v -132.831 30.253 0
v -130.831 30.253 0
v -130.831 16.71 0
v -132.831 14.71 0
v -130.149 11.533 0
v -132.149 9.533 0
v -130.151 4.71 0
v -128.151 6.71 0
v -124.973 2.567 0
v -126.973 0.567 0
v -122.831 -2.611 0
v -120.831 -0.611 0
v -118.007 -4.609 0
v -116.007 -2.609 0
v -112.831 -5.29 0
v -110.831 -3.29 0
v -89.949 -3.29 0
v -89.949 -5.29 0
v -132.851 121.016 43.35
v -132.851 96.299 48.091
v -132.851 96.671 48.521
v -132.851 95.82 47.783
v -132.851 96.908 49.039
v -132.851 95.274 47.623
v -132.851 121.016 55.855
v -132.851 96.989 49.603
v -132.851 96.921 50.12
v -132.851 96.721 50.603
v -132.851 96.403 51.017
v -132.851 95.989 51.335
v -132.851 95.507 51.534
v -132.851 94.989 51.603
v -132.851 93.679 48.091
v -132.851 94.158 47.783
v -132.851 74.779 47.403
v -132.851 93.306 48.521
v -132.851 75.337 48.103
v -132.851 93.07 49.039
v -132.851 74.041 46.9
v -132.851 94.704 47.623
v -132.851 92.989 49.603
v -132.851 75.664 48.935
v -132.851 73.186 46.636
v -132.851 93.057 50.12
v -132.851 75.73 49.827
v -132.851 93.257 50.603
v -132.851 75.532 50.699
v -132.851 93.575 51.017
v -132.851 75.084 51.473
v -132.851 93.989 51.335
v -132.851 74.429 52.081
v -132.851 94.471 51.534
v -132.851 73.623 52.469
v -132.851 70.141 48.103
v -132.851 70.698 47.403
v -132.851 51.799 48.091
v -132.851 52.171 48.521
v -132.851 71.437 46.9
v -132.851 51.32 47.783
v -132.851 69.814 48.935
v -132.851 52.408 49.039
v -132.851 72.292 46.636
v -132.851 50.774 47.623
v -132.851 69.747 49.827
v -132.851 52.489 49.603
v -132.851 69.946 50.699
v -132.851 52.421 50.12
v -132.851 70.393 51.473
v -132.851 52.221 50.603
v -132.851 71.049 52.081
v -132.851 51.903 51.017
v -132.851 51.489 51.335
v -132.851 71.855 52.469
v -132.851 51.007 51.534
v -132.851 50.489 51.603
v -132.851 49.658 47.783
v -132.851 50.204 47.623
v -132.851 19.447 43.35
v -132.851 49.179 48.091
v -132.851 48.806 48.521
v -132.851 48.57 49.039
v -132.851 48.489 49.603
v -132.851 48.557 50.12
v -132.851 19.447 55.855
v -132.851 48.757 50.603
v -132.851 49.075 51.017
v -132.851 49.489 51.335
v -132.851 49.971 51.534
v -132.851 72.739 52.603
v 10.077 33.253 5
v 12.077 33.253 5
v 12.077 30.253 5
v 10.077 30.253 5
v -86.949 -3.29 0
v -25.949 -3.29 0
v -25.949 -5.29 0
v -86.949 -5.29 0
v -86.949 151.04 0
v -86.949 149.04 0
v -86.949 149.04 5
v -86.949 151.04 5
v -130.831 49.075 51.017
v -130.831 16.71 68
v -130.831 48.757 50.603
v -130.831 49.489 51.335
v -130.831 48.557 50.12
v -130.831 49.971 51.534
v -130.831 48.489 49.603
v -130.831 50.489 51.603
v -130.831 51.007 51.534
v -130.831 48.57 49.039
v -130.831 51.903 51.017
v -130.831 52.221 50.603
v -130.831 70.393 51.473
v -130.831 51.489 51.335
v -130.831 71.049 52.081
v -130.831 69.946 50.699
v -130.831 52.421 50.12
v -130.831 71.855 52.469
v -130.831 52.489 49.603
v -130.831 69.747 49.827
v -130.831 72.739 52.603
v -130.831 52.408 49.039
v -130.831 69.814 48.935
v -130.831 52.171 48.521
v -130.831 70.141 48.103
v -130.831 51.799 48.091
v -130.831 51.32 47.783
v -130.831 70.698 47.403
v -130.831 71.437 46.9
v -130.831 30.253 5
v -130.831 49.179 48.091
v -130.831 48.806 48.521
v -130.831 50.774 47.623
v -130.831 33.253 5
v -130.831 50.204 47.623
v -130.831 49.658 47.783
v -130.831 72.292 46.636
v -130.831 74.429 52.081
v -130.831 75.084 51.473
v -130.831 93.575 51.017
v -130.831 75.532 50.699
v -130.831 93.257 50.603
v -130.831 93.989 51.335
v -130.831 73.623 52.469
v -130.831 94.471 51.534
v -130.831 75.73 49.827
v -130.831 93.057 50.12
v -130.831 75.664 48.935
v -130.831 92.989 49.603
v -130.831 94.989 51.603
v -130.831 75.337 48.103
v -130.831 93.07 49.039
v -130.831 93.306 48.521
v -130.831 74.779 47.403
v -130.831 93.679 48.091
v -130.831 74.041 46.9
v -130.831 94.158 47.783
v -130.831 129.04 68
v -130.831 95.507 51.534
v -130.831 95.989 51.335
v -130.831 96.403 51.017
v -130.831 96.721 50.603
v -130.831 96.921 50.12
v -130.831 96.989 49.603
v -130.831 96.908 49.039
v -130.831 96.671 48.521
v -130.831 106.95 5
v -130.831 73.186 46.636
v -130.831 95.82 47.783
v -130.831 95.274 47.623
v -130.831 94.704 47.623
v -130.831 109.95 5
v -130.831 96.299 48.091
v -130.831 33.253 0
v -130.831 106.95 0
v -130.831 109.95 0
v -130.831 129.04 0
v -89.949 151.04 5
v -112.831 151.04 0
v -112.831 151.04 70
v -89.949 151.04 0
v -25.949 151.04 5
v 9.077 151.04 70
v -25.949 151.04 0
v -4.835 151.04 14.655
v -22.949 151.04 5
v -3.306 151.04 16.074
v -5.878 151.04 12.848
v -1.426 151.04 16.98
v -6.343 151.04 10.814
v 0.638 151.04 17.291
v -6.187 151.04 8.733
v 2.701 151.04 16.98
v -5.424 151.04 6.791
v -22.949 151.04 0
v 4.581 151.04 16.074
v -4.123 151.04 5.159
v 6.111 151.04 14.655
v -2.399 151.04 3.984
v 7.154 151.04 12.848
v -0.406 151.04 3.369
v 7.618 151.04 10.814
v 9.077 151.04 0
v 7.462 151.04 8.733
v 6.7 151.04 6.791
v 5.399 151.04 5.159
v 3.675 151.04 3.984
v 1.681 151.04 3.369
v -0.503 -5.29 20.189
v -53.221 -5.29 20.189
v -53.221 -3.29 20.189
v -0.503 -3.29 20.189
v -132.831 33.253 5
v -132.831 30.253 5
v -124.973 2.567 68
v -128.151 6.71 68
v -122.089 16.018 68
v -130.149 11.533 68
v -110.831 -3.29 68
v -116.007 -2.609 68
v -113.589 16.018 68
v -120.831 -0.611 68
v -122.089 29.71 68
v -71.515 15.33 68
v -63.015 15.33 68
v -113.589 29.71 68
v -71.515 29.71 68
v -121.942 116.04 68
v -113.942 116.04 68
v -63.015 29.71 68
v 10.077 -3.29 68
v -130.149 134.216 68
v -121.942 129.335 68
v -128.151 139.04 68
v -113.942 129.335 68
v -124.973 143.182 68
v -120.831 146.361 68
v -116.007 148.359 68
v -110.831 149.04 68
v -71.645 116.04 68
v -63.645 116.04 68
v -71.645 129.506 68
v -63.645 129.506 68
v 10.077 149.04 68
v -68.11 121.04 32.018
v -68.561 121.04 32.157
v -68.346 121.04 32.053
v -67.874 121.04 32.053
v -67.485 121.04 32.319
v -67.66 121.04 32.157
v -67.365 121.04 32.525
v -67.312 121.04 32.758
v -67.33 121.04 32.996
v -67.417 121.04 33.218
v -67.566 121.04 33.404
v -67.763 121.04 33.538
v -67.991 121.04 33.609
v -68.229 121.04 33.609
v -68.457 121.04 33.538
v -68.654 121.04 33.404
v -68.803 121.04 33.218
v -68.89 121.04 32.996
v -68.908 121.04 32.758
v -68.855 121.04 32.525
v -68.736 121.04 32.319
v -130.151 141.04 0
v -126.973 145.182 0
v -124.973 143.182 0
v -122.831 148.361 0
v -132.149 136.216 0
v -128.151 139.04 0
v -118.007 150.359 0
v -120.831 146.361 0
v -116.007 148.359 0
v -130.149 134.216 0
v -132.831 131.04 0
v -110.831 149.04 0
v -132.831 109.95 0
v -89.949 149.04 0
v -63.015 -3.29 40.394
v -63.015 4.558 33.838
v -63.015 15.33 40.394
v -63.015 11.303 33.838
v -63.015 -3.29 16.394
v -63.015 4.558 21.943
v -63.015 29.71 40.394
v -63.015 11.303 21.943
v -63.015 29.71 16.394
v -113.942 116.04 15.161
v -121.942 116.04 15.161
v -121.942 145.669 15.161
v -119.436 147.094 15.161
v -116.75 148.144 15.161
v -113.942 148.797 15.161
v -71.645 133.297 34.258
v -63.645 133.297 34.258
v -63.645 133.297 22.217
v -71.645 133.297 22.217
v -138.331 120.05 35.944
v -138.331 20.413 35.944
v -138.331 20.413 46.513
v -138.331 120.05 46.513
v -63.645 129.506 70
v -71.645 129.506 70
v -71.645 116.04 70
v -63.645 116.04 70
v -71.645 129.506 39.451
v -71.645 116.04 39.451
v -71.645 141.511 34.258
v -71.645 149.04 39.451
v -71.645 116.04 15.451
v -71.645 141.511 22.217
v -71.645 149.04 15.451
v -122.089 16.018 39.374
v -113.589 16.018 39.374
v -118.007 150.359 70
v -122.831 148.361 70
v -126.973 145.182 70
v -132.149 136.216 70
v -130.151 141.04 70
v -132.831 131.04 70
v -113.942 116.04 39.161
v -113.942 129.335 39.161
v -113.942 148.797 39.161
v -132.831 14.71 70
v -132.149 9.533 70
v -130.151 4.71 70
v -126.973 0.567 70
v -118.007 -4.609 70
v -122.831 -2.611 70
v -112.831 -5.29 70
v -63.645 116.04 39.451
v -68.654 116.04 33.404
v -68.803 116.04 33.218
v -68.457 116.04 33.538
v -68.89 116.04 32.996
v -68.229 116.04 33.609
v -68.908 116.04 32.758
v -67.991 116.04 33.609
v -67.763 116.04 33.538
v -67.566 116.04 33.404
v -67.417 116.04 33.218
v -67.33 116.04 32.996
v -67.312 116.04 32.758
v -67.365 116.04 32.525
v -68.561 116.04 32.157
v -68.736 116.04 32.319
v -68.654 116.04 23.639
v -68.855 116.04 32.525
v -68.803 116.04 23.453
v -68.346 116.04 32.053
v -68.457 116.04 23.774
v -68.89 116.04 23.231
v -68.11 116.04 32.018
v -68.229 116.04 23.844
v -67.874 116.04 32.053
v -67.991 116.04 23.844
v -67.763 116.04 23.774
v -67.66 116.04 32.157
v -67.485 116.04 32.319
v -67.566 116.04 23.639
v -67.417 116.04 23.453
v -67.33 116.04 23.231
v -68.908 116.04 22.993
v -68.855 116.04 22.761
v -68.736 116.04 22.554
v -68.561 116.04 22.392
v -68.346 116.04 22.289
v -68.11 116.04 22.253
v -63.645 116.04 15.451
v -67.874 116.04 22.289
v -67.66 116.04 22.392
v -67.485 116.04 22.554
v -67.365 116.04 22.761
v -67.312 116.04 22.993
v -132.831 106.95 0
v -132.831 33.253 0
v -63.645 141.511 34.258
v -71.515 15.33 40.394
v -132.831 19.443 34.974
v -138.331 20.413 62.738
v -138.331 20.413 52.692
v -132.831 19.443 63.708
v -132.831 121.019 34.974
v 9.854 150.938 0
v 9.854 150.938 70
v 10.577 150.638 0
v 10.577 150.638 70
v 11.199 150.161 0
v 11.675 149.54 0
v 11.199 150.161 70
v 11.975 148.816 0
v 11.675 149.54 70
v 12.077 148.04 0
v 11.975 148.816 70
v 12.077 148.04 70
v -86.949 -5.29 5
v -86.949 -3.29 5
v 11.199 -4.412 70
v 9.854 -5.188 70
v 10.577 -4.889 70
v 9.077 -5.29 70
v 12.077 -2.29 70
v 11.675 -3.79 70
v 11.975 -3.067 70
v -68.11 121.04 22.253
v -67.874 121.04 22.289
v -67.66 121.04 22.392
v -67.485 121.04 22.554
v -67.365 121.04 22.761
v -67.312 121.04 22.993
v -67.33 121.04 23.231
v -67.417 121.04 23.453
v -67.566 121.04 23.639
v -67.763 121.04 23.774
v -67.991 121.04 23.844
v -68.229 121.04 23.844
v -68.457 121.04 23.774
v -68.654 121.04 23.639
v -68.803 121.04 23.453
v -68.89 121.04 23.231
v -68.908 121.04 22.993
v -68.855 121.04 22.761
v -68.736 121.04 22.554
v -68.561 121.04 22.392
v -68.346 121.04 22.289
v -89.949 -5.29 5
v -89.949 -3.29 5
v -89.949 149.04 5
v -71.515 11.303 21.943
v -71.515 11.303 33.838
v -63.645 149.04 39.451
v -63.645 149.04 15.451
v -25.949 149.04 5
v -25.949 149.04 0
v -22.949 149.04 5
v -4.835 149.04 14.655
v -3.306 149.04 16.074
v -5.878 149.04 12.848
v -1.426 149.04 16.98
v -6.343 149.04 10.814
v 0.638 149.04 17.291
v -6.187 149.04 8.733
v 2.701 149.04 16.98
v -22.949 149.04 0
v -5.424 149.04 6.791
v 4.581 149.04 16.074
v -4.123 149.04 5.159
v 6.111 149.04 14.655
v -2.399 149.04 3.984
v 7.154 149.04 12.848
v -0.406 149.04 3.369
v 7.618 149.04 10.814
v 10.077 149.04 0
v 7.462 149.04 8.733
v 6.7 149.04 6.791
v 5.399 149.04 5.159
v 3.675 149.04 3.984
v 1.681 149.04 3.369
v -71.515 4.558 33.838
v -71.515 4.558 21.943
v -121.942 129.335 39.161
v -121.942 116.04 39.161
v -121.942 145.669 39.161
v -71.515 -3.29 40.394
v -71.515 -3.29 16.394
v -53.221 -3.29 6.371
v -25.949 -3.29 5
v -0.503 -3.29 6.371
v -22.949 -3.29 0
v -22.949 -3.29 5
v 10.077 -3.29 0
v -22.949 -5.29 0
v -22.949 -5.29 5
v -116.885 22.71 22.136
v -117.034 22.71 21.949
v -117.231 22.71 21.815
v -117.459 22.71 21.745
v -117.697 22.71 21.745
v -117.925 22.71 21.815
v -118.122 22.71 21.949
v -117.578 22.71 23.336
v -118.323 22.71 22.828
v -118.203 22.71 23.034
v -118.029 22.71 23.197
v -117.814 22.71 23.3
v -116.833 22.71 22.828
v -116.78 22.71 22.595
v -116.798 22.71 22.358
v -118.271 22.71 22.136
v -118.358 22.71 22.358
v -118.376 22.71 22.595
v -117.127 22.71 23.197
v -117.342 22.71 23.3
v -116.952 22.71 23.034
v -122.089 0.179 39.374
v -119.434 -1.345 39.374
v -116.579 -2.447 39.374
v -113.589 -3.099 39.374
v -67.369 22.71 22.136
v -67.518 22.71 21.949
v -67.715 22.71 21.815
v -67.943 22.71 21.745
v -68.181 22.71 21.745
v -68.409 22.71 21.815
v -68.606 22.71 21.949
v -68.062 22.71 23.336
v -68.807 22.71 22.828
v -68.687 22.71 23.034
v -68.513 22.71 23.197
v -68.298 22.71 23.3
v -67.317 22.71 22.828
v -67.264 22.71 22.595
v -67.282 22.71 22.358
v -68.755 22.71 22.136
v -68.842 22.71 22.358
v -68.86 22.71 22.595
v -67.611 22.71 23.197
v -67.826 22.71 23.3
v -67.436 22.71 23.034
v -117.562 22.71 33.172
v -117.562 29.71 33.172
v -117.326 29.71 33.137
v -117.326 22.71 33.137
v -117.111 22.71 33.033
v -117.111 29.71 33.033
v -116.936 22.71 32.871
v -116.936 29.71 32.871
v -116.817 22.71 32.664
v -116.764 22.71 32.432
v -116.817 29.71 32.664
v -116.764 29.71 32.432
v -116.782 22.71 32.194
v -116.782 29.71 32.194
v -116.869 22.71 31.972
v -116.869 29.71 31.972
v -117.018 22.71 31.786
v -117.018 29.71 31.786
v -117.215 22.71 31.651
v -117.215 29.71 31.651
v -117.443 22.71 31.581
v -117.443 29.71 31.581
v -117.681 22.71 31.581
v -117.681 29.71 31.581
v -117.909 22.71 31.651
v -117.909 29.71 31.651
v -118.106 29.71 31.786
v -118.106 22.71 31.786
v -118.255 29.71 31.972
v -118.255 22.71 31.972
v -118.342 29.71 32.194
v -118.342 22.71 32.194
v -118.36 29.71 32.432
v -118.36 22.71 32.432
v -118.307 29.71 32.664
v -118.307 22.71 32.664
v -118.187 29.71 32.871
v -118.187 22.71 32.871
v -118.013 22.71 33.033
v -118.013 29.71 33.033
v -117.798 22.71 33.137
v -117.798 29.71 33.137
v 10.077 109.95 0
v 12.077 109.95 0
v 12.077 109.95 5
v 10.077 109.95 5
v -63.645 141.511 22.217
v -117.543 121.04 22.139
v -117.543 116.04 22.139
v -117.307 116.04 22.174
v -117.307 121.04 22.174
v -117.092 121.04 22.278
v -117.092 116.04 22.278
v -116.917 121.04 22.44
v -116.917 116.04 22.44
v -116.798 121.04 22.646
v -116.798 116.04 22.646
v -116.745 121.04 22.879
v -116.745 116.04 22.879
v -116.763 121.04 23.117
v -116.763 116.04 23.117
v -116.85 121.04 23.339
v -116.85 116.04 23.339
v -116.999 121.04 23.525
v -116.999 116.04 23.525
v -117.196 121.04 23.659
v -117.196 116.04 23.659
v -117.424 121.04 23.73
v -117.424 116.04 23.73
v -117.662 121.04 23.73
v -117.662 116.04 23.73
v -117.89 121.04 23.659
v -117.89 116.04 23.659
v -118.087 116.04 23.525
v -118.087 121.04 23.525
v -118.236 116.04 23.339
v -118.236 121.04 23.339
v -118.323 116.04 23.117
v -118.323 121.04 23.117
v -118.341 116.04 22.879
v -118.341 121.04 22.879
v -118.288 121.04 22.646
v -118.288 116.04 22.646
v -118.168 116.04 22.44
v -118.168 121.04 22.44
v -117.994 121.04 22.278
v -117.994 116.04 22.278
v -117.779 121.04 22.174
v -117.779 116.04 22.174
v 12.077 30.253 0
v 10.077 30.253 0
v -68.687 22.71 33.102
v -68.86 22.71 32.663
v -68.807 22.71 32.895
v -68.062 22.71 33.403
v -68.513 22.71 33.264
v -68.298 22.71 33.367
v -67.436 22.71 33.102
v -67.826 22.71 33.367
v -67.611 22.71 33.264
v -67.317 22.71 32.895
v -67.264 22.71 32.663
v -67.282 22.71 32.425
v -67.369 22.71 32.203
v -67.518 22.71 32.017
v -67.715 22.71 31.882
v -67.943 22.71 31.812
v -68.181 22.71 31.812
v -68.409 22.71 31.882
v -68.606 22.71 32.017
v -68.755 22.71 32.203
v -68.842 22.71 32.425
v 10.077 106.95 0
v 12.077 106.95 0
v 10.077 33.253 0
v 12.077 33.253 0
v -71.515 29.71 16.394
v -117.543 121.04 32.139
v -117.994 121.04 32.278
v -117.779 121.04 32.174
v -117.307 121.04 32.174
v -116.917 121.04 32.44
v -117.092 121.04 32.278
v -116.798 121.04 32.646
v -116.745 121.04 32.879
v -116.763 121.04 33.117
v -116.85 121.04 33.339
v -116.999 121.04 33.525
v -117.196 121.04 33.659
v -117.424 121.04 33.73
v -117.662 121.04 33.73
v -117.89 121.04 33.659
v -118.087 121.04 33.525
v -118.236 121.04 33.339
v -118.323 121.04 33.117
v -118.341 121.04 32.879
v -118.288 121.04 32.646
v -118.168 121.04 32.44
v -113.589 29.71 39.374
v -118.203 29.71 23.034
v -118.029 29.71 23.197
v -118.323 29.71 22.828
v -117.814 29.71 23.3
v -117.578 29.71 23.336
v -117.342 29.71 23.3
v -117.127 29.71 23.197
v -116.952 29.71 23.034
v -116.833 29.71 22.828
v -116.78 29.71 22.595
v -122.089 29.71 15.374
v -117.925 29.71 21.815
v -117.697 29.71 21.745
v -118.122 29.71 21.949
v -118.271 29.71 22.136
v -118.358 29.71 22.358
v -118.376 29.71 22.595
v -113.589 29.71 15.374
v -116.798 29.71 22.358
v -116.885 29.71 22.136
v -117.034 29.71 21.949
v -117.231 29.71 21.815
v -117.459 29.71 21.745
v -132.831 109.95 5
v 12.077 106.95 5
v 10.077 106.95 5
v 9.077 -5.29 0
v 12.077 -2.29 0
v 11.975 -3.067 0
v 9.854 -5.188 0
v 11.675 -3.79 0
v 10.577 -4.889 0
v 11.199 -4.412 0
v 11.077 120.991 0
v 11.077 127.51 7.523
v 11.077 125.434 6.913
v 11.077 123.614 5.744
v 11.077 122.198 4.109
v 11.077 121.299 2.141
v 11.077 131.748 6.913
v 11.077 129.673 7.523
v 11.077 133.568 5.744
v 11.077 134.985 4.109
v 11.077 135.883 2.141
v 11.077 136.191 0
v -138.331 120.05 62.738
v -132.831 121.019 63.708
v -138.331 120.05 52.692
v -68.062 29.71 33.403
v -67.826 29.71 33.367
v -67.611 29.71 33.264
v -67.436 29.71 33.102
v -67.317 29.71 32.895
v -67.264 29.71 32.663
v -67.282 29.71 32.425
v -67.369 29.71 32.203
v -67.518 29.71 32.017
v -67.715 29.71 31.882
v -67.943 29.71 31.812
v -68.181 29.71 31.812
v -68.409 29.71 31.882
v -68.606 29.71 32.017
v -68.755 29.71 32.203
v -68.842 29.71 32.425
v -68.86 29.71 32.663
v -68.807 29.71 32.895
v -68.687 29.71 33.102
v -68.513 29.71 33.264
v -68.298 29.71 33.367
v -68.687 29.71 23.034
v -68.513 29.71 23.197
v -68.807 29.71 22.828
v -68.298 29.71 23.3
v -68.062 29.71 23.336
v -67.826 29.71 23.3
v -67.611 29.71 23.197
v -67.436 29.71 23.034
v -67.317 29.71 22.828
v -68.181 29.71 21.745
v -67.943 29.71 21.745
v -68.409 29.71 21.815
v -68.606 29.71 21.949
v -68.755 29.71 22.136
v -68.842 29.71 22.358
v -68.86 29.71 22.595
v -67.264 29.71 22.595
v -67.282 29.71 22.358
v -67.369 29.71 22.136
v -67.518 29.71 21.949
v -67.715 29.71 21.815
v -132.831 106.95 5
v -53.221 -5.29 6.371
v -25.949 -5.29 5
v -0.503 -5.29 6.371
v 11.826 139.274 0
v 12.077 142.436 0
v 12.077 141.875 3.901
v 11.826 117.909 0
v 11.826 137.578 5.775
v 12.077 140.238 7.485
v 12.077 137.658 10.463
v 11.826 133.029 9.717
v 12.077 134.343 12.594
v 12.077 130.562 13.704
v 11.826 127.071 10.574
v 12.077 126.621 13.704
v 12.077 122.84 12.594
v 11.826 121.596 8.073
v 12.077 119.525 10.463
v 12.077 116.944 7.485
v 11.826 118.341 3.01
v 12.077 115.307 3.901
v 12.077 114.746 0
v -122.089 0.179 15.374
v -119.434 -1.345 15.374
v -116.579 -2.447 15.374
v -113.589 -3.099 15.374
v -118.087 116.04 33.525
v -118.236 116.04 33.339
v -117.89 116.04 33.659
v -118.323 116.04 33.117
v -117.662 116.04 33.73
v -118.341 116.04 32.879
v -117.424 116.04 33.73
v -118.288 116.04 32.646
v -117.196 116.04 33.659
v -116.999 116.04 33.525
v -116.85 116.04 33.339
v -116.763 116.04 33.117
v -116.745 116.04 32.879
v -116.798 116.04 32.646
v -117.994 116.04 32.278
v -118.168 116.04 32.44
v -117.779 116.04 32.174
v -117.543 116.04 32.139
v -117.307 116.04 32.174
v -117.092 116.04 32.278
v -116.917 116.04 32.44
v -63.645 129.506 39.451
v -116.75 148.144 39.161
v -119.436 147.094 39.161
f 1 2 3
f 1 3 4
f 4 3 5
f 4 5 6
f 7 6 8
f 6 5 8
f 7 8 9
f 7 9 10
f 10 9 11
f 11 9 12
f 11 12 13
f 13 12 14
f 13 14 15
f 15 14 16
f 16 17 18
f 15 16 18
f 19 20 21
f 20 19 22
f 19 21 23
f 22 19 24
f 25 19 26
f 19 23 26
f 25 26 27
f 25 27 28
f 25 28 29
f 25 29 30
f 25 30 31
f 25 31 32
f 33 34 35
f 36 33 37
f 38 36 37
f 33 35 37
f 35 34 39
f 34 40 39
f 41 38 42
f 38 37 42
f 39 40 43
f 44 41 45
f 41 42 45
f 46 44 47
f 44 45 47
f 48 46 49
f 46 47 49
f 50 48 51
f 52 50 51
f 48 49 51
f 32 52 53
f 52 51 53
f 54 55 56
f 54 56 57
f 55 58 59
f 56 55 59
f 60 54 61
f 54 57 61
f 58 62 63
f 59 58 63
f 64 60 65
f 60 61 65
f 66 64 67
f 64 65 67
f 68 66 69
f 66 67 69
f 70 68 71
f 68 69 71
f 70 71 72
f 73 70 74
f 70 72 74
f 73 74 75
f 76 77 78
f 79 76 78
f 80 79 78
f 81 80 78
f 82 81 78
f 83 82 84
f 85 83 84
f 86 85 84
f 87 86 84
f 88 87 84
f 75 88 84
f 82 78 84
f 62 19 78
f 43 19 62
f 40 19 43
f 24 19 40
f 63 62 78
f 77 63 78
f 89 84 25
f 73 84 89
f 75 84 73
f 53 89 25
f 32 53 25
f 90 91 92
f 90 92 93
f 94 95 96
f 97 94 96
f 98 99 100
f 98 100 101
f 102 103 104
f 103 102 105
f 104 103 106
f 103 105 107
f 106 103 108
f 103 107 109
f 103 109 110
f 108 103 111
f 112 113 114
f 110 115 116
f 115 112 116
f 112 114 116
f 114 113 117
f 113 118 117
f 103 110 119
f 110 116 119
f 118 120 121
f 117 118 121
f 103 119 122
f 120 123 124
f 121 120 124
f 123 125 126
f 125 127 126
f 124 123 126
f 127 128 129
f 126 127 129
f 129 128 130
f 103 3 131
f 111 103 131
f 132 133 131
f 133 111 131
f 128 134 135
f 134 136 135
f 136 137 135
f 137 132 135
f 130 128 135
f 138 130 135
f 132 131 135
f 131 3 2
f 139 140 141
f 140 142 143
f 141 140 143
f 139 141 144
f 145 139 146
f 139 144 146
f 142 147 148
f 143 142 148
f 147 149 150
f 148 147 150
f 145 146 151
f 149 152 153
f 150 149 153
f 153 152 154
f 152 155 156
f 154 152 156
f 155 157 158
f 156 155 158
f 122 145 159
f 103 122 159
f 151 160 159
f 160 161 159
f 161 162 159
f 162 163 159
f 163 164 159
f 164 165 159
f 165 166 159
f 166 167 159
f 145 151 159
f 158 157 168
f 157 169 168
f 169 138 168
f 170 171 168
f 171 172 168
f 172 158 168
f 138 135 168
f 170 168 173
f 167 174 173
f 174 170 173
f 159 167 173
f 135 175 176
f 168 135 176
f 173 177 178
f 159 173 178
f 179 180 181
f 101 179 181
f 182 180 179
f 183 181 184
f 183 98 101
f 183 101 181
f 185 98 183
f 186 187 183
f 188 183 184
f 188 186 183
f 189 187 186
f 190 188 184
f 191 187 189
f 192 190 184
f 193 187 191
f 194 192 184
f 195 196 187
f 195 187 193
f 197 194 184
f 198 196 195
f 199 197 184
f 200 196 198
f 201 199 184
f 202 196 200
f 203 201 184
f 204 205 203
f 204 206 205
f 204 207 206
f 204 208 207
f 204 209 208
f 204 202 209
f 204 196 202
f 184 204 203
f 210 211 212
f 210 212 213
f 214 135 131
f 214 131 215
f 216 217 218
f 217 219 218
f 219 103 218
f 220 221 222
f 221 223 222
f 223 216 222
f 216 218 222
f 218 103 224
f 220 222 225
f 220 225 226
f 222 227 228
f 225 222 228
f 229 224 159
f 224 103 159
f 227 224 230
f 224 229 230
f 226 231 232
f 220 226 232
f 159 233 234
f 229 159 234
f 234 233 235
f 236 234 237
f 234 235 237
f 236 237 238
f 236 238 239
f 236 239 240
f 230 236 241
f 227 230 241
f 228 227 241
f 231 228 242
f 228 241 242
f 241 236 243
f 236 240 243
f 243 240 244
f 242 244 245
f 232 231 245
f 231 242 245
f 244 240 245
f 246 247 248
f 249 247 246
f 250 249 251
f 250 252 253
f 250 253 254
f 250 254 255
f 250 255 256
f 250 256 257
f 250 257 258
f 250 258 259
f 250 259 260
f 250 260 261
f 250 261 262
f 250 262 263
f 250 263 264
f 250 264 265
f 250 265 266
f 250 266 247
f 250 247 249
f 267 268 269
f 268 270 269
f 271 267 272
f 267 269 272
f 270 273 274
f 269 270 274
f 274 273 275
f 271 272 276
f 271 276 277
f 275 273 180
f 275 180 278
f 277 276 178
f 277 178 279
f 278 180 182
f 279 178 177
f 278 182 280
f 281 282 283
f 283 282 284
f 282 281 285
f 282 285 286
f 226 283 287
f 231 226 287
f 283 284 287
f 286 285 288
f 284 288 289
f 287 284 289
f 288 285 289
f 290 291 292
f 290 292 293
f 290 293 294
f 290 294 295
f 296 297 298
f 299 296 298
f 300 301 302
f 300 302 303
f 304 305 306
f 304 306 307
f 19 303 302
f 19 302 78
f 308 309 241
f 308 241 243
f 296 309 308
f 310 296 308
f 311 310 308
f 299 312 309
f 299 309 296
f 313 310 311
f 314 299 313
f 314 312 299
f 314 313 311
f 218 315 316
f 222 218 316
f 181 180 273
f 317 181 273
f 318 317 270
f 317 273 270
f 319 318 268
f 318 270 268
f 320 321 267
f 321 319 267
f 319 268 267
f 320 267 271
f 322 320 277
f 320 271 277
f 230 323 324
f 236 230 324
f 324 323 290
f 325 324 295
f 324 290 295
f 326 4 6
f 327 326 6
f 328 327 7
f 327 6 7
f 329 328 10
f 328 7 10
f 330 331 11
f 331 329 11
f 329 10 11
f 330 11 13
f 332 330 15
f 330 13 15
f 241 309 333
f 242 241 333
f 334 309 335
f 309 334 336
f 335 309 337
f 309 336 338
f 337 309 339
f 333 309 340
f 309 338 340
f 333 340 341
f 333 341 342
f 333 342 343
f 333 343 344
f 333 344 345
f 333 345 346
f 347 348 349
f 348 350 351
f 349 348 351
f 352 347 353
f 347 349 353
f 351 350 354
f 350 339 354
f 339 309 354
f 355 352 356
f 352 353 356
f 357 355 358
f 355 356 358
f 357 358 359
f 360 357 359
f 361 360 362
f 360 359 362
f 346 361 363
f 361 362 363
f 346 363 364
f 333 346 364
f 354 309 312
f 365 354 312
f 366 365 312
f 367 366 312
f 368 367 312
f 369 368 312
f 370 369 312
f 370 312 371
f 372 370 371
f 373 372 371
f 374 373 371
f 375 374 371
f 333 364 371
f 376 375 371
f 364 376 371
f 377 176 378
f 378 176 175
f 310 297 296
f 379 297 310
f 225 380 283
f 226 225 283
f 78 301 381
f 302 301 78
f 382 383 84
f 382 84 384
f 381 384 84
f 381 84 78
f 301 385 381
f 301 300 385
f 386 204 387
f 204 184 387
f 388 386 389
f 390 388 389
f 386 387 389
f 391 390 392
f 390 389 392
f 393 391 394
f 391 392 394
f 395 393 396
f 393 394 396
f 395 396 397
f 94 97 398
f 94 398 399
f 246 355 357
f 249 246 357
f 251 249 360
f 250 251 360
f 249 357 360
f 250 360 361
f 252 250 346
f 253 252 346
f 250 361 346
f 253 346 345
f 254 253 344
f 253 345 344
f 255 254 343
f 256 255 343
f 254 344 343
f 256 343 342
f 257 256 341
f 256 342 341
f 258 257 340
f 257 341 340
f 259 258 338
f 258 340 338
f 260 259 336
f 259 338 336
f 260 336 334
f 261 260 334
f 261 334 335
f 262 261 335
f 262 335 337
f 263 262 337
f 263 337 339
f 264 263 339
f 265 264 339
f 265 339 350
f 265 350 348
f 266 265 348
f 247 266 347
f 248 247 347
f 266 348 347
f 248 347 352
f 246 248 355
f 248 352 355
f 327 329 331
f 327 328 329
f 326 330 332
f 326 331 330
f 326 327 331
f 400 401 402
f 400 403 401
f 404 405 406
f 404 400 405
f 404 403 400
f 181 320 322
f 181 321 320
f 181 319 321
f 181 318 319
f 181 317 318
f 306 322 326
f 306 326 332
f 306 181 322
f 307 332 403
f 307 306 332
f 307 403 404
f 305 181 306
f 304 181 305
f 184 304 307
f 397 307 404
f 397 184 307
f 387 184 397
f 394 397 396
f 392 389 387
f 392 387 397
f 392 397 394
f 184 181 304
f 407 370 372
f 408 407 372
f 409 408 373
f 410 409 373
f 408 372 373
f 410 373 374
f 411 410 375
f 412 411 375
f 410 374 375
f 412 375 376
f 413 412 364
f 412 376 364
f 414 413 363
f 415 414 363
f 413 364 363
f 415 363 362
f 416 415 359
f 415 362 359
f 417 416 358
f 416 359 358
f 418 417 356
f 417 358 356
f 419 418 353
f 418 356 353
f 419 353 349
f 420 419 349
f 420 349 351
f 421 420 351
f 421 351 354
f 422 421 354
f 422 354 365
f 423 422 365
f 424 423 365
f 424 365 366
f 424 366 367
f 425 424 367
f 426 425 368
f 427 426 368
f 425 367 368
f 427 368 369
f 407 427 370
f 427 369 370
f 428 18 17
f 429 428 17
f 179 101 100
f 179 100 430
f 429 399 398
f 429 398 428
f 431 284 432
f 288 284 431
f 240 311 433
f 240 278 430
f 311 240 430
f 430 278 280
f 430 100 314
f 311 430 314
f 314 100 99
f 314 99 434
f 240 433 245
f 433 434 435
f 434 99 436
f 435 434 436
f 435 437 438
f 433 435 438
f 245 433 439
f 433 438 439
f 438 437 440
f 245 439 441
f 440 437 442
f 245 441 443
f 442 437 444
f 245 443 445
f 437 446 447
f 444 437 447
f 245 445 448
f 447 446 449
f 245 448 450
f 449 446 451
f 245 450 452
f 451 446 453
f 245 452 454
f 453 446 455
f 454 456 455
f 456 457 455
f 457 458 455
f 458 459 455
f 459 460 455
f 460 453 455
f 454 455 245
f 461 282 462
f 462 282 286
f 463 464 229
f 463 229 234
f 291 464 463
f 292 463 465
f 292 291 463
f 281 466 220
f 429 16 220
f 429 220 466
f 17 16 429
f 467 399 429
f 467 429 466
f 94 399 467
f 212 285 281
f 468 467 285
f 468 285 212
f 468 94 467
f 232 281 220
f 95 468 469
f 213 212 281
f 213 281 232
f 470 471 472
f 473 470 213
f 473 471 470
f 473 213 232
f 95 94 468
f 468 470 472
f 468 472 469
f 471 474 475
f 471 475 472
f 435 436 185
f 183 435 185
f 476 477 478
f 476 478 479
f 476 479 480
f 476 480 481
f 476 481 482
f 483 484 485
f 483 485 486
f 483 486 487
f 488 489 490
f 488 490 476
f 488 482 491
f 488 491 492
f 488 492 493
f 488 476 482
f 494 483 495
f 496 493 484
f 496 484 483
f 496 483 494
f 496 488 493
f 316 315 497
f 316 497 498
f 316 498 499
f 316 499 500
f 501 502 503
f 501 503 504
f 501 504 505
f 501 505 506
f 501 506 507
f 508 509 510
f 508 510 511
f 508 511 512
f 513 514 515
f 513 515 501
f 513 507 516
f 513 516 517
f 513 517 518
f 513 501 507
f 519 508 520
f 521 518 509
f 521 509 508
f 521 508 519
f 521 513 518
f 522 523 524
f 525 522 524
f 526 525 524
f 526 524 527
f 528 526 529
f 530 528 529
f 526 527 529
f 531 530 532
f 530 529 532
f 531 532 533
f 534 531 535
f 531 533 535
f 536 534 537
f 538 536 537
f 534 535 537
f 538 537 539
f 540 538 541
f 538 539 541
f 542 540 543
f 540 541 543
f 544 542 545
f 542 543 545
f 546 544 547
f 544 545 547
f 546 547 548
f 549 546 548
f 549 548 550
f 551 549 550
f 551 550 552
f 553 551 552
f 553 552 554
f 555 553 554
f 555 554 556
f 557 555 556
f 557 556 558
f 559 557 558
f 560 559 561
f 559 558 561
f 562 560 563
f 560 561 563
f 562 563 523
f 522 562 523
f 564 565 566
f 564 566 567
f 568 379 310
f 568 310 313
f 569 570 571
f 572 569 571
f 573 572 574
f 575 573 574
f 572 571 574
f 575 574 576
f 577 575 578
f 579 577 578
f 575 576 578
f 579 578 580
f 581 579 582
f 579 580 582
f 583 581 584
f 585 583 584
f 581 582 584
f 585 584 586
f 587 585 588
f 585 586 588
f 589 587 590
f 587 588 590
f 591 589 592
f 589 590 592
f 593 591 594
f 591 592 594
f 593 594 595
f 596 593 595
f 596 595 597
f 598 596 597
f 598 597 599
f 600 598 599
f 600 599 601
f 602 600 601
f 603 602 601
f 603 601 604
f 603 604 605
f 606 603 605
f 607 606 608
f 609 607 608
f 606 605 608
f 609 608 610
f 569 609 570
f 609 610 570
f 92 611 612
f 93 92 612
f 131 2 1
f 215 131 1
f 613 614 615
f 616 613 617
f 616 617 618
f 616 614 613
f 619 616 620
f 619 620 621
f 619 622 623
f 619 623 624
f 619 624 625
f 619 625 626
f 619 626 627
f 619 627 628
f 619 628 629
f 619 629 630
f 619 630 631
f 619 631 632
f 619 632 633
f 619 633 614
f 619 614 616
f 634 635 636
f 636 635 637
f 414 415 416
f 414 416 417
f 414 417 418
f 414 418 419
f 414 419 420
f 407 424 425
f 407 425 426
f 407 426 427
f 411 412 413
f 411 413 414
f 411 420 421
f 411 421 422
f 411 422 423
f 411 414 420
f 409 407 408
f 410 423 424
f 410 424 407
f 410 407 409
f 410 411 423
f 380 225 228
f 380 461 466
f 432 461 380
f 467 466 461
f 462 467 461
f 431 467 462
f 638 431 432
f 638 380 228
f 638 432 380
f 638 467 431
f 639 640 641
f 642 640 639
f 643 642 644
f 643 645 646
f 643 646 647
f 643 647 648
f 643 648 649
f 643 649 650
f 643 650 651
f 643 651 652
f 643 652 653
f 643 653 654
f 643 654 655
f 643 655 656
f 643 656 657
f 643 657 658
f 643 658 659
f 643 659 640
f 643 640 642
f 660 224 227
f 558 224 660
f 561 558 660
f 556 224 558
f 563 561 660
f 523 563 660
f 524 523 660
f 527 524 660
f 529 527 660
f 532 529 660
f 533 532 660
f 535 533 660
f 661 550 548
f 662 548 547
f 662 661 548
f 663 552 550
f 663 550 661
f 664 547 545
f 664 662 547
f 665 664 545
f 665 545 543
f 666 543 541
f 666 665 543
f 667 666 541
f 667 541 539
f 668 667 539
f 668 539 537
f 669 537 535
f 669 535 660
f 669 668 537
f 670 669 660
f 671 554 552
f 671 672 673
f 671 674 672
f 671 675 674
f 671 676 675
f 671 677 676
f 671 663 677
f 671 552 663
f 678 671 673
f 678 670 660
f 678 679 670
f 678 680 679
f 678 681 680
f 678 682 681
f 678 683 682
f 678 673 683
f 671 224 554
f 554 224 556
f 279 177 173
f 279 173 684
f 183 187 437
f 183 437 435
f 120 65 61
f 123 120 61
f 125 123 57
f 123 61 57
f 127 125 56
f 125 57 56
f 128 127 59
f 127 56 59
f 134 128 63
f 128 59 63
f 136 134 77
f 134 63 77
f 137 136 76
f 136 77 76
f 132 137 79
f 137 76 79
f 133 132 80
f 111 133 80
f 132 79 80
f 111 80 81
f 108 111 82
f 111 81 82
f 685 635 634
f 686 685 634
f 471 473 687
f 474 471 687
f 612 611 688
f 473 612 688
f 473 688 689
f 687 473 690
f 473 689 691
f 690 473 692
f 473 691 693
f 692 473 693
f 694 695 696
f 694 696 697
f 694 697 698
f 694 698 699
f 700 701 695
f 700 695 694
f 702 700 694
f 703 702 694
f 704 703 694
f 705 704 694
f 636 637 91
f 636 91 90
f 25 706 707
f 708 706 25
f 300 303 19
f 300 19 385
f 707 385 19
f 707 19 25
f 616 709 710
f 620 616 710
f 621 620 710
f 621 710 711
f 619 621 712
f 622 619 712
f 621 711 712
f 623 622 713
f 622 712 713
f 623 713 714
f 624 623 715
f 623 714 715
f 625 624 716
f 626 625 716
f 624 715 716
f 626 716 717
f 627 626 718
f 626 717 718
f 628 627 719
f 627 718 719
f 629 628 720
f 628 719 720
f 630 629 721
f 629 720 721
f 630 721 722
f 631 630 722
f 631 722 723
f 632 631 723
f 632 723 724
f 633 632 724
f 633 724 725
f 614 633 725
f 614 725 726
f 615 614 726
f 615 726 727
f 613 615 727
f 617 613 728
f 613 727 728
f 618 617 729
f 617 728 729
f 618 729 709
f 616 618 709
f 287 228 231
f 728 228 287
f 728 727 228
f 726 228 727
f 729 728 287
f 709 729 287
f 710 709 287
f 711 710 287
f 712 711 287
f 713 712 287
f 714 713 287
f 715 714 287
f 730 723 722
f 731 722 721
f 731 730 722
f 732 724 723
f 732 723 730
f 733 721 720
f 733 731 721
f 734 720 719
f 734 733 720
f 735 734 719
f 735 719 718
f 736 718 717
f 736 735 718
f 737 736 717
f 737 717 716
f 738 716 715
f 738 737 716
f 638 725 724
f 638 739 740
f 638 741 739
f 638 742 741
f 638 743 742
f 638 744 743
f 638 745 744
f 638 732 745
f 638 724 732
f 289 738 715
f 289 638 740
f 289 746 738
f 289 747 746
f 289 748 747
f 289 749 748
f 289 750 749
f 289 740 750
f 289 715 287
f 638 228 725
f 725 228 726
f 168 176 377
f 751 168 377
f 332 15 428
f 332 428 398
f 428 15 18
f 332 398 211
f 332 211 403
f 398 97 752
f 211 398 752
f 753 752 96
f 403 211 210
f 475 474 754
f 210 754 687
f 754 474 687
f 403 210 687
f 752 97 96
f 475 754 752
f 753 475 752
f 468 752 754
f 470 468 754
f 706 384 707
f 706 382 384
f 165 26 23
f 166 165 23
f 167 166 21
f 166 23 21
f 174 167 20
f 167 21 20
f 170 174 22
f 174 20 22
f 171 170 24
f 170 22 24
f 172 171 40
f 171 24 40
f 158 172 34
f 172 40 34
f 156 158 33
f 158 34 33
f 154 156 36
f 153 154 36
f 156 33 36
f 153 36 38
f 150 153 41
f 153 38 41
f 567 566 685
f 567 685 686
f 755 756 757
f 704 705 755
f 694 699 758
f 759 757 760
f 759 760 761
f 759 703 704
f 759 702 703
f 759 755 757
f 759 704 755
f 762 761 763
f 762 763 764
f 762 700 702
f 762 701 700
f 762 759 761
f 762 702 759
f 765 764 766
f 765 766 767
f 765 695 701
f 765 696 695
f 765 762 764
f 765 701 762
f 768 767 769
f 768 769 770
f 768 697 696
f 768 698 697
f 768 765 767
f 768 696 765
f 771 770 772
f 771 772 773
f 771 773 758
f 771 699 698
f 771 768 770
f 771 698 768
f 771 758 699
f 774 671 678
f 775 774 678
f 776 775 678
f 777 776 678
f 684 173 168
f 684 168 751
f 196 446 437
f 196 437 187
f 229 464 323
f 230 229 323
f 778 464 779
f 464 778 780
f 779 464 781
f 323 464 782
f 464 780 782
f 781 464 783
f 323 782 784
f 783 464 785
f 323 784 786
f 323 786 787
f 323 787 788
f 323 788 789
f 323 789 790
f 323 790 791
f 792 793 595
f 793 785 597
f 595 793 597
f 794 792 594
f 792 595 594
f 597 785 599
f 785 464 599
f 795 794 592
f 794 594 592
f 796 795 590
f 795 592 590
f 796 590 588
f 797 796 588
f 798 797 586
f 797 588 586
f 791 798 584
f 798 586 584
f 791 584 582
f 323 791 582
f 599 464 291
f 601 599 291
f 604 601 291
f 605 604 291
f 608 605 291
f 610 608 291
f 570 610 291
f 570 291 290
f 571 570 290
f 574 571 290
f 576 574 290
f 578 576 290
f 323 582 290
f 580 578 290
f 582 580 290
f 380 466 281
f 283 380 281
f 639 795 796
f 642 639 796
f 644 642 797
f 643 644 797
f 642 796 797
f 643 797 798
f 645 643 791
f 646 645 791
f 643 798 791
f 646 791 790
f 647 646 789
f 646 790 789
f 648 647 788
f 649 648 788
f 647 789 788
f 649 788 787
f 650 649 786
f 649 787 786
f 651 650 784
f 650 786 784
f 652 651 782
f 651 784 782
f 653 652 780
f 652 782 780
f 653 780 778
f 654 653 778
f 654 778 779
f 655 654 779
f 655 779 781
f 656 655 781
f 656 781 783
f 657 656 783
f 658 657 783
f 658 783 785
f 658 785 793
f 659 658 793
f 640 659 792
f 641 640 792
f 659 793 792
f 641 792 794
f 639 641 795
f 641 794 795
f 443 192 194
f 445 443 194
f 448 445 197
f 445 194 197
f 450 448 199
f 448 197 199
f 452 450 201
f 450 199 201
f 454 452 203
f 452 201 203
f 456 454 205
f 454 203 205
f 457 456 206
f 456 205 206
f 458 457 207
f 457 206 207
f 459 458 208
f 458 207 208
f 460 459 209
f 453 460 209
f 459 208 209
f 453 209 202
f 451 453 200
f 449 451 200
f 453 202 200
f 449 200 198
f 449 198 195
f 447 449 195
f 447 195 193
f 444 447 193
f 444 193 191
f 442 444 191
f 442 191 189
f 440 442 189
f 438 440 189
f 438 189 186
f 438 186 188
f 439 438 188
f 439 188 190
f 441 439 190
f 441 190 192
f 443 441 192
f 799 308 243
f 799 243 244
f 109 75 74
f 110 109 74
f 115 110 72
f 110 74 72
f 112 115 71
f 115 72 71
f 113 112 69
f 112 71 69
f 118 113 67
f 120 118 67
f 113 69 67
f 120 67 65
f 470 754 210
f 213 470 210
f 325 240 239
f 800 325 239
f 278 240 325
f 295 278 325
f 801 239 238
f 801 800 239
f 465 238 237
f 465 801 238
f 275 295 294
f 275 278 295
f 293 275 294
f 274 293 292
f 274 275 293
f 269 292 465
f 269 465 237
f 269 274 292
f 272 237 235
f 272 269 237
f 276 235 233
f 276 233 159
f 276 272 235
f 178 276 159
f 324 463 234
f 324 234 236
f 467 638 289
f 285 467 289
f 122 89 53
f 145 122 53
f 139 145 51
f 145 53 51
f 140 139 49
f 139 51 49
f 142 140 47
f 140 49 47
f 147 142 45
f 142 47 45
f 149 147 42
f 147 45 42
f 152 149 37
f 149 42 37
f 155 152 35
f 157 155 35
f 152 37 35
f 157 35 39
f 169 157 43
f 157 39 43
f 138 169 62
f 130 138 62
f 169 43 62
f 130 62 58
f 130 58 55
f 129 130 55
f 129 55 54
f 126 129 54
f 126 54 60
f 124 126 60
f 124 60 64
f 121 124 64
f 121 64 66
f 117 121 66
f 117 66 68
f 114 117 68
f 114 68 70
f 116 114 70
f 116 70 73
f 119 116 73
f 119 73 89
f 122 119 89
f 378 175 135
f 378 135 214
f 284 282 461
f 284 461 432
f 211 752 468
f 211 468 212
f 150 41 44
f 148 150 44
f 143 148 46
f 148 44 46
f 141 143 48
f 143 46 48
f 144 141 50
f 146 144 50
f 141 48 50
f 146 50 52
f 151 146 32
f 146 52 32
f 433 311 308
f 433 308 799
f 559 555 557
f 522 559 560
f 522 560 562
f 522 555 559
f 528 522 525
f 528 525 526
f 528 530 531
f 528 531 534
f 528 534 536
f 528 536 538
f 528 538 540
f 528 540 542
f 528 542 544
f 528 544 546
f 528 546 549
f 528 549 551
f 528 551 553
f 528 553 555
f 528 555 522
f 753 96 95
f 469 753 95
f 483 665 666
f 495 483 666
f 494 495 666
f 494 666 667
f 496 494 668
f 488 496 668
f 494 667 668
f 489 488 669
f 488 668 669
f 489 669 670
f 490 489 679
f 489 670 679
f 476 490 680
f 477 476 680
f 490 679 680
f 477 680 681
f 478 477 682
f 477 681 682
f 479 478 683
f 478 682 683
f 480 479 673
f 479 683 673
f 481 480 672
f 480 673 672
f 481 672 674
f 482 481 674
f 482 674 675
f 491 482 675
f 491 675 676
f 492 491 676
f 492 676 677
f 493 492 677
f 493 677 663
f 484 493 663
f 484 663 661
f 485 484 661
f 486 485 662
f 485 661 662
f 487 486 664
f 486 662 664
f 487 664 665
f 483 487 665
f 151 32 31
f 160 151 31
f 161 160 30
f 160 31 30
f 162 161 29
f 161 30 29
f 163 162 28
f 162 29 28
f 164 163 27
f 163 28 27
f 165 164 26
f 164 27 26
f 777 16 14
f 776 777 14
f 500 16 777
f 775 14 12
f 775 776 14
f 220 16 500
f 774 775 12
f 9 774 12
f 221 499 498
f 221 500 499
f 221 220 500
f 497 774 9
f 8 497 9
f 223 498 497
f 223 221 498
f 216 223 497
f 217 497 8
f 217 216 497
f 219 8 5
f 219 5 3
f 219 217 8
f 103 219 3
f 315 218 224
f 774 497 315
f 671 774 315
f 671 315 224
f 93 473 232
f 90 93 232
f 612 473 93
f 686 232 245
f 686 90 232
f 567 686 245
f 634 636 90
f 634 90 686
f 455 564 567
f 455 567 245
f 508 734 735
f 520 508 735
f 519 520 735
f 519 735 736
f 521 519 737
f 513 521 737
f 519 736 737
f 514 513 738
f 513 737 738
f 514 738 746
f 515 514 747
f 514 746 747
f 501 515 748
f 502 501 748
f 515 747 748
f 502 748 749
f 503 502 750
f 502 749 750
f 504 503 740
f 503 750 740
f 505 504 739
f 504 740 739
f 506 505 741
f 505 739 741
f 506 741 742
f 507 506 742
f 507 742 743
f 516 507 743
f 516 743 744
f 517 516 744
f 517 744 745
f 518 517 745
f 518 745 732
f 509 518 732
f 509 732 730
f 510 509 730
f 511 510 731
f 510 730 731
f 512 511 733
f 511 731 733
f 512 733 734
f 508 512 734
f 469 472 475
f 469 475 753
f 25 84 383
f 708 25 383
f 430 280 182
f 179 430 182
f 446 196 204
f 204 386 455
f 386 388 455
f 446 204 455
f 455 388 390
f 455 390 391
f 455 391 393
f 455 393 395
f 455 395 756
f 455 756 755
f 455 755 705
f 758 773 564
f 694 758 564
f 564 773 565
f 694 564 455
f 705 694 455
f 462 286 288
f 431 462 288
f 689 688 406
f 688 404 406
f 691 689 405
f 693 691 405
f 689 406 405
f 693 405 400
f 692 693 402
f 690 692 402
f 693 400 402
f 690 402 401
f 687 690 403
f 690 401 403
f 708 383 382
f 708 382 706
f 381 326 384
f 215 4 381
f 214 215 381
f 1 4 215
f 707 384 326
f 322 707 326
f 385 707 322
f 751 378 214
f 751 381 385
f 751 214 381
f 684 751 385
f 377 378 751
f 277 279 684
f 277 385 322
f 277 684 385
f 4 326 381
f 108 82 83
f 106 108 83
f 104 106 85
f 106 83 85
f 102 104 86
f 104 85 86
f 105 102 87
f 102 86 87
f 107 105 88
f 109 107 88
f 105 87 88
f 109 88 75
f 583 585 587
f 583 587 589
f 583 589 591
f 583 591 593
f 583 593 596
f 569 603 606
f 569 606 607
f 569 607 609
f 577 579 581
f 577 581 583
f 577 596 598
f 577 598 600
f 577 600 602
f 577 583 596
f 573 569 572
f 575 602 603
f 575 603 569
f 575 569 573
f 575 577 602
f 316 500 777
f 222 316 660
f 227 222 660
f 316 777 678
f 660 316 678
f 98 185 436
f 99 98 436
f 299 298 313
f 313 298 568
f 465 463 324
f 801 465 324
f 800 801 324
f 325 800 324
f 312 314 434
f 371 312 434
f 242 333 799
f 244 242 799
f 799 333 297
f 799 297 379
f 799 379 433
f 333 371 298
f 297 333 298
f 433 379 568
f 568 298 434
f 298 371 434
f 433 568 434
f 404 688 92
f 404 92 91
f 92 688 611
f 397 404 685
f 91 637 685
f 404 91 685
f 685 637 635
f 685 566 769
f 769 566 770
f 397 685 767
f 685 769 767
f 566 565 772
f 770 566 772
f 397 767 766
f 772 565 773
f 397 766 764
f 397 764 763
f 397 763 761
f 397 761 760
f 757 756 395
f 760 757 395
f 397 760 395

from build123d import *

# Parameters (mm, degrees)
ESQUISSE2_W              = 144.907881123
ESQUISSE2_H              = 156.330521118
BOSS_EXTRU_1_DEPTH       = 70
COQUE1_T                 = -2
ESQUISSE14_W             = 28.733729995
ESQUISSE14_H             = 101.576382864
BOSS_EXTRU_7_DEPTH       = 5.5
BOSS_EXTRU_7_TAPER       = 10
ENL_V_MAT_EXTRU_5_DEPTH  = 137.5
ESQUISSE16_R             = 3
ENL_V_MAT_EXTRU_6_DEPTH  = 3
ESQUISSE17_W             = 8
ESQUISSE17_H             = 24
BOSS_EXTRU_8_DEPTH       = 33
ESQUISSE18_W             = 12.041056231
ESQUISSE18_H             = 8.214509438
ENL_V_MAT_EXTRU_7_DEPTH  = 9
ESQUISSE19_R             = 0.8
ENL_V_MAT_EXTRU_8_DEPTH  = 5
ESQUISSE20_W             = 8.5
ESQUISSE20_H             = 24
BOSS_EXTRU_9_DEPTH       = 33
ESQUISSE22_W             = 11.894232579
ESQUISSE22_H             = 6.744261383
ENL_V_MAT_EXTRU_9_DEPTH  = 10
ESQUISSE25_W             = 8
ESQUISSE25_H             = 13.466046283
BOSS_EXTRU_10_DEPTH      = 30.549003
ESQUISSE26_W             = 8
ESQUISSE26_H             = 13.295181457
BOSS_EXTRU_11_DEPTH      = 30
ESQUISSE27_W             = 8.5
ESQUISSE27_H             = 13.691611871
BOSS_EXTRU_12_DEPTH      = 30
ESQUISSE28_W             = 8.5
ESQUISSE28_H             = 14.379576359
BOSS_EXTRU_14_DEPTH      = 29
ESQUISSE29_R             = 7
ENL_V_MAT_EXTRU_11_DEPTH = 5
ESQUISSE30_W             = 52.718186521
ESQUISSE30_H             = 13.817926224
ENL_V_MAT_EXTRU_12_DEPTH = 5
CONG_4_R                 = 20
CONG_5_R                 = 3
ENL_V_MAT_EXTRU_13_DEPTH = 1
CONG_6_R                 = 20
ESQUISSE21_R             = 0.8
ENL_V_MAT_EXTRU_14_DEPTH = 7
ESQUISSE34_W             = 2
ESQUISSE34_H             = 3
ESQUISSE34_W_2           = 3
ESQUISSE34_H_2           = 2
ENL_V_MAT_EXTRU_15_DEPTH = 5


with BuildPart() as part:
    # Esquisse2 → Boss.-Extru.1 (new body)
    with BuildSketch(Plane.XY):
        with Locations((-60.376721844, 72.874764276)):
            Rectangle(ESQUISSE2_W, ESQUISSE2_H)
    extrude(amount=BOSS_EXTRU_1_DEPTH)

    # Coque1
    coque1_openings = [part.faces().sort_by_distance(p)[0] for p in [
        (-60.376721844, 72.874764276, 0),
    ]]
    offset(amount=COQUE1_T, openings=coque1_openings, kind=Kind.INTERSECTION)

    # Esquisse14 → Boss.-Extru.7 (add)
    with BuildSketch(Plane.ZY.offset(132.830662405)):
        with Locations((49.34125564, 70.231172893)):
            Rectangle(ESQUISSE14_W, ESQUISSE14_H)
    extrude(amount=BOSS_EXTRU_7_DEPTH, taper=BOSS_EXTRU_7_TAPER)

    # Troue matien spirobs → Enlèv. mat.-Extru.5 (cut)
    # profile 1 of 2: a face of its own
    with BuildSketch(Plane(origin=(0, 0, 0), x_dir=(1, 0, 0), z_dir=(0, 1, 0))):
        Polygon((-132.851084635, -55.85540738), (-138.851094768, -52.391307109), (-138.851094768, -46.813956352), (-132.851084635, -43.34985608), align=None)
        Polygon((-133.351084635, -54.989382875), (-138.351094768, -52.102631674), (-138.351094768, -47.102631786), (-133.351084635, -44.215880585), align=None, mode=Mode.SUBTRACT)
    # profile 2 of 2: a face of its own
    with BuildSketch(Plane(origin=(0, 0, 0), x_dir=(1, 0, 0), z_dir=(0, 1, 0))):
        Polygon((-138.351094768, -52.102631674), (-138.351094768, -47.102631786), (-133.351084635, -44.215880585), (-133.351084635, -54.989382875), align=None)
    extrude(amount=ENL_V_MAT_EXTRU_5_DEPTH, mode=Mode.SUBTRACT)

    # Esquisse16 → Enlèv. mat.-Extru.6 (cut)
    with BuildSketch(Plane.ZY.offset(132.851084635)):
        with BuildLine():
            ThreePointArc((51.60263173, 94.988881377), (51.016845292, 96.403094939), (49.60263173, 96.988881377))
            Line((49.60263173, 96.988881377), (49.60263173, 92.988881377))
            ThreePointArc((49.60263173, 92.988881377), (51.016845292, 93.574667814), (51.60263173, 94.988881377))
        make_face()
        with BuildLine():
            Line((49.60263173, 92.988881377), (49.60263173, 96.988881377))
            ThreePointArc((49.60263173, 96.988881377), (47.60263173, 94.988881377), (49.60263173, 92.988881377))
        make_face()
        with BuildLine():
            ThreePointArc((51.60263173, 50.488881377), (51.016845292, 51.903094939), (49.60263173, 52.488881377))
            Line((49.60263173, 52.488881377), (49.60263173, 48.488881377))
            ThreePointArc((49.60263173, 48.488881377), (51.016845292, 49.074667814), (51.60263173, 50.488881377))
        make_face()
        with BuildLine():
            Line((49.60263173, 48.488881377), (49.60263173, 52.488881377))
            ThreePointArc((49.60263173, 52.488881377), (47.60263173, 50.488881377), (49.60263173, 48.488881377))
        make_face()
        with Locations((49.60263173, 72.738881377)):
            Circle(ESQUISSE16_R)
    extrude(amount=-ENL_V_MAT_EXTRU_6_DEPTH, mode=Mode.SUBTRACT)

    # Esquisse17 → Boss.-Extru.8 (add)
    with BuildSketch(Plane.XZ.offset(-149.040024835)):
        with Locations((-67.645104732, 27.450996733)):
            Rectangle(ESQUISSE17_W, ESQUISSE17_H)
        with Locations((-117.942168048, 27.160873918)):
            Rectangle(ESQUISSE17_W, ESQUISSE17_H)
    extrude(amount=BOSS_EXTRU_8_DEPTH)

    # Esquisse18 → Enlèv. mat.-Extru.7 (cut)
    with BuildSketch(Plane(origin=(-63.645104732, 0, 0), x_dir=(0, 0, -1), z_dir=(1, 0, 0))):
        with Locations((-28.237409826, 137.403900729)):
            Rectangle(ESQUISSE18_W, ESQUISSE18_H)
    extrude(amount=-ENL_V_MAT_EXTRU_7_DEPTH, mode=Mode.SUBTRACT)

    # Esquisse19 → Enlèv. mat.-Extru.8 (cut)
    with BuildSketch(Plane.XZ.offset(-116.040024835)):
        with Locations(Location((-68.110177619, 23.053024635, 0), (0, 0, 270))):
            Circle(ESQUISSE19_R)
        with Locations(Location((-68.110177619, 32.817579673, 0), (0, 0, 270))):
            Circle(ESQUISSE19_R)
        with Locations(Location((-117.542963794, 32.93870849, 0), (0, 0, 270))):
            Circle(ESQUISSE19_R)
        with Locations(Location((-117.542963794, 22.93870849, 0), (0, 0, 270))):
            Circle(ESQUISSE19_R)
    extrude(amount=-ENL_V_MAT_EXTRU_8_DEPTH, mode=Mode.SUBTRACT)

    # Esquisse20 → Boss.-Extru.9 (add)
    with BuildSketch(Plane(origin=(0, -3.290496283, 0), x_dir=(1, 0, 0), z_dir=(0, 1, 0))):
        with Locations((-117.838572927, -27.374102793)):
            Rectangle(ESQUISSE20_W, ESQUISSE20_H)
        with Locations((-67.264692574, -28.393869792)):
            Rectangle(ESQUISSE20_W, ESQUISSE20_H)
    extrude(amount=BOSS_EXTRU_9_DEPTH)

    # Esquisse22 → Enlèv. mat.-Extru.9 (cut)
    with BuildSketch(Plane(origin=(-63.014692574, 0, 0), x_dir=(0, 0, -1), z_dir=(1, 0, 0))):
        with Locations((-27.890614159, 7.930587585)):
            Rectangle(ESQUISSE22_W, ESQUISSE22_H)
    extrude(amount=-ENL_V_MAT_EXTRU_9_DEPTH, mode=Mode.SUBTRACT)

    # Esquisse25 → Boss.-Extru.10 (add)
    with BuildSketch(Plane.XY.offset(39.450996733)):
        with Locations((-67.645104732, 122.773047977)):
            Rectangle(ESQUISSE25_W, ESQUISSE25_H)
    extrude(amount=BOSS_EXTRU_10_DEPTH)

    # Esquisse26 → Boss.-Extru.11 (add)
    with BuildSketch(Plane.XY.offset(39.160873918)):
        with Locations((-117.942168048, 122.687615564)):
            Rectangle(ESQUISSE26_W, ESQUISSE26_H)
    extrude(amount=BOSS_EXTRU_11_DEPTH)

    # Esquisse27 → Boss.-Extru.12 (add)
    with BuildSketch(Plane.XY.offset(39.374102793)):
        with Locations((-117.838572927, 22.863697782)):
            Rectangle(ESQUISSE27_W, ESQUISSE27_H)
    extrude(amount=BOSS_EXTRU_12_DEPTH)

    # Esquisse28 → Boss.-Extru.14 (add)
    with BuildSketch(Plane.XY.offset(40.393869792)):
        with Locations((-67.264692574, 22.519715538)):
            Rectangle(ESQUISSE28_W, ESQUISSE28_H)
    extrude(amount=BOSS_EXTRU_14_DEPTH)

    # Esquisse29 → Enlèv. mat.-Extru.11 (cut)
    with BuildSketch(Plane(origin=(0, 151.040024835, 0), x_dir=(1, 0, 0), z_dir=(0, 1, 0))):
        with Locations(Location((0.637722391, -10.29069879, 0), (0, 0, 270))):
            Circle(ESQUISSE29_R)
    extrude(amount=-ENL_V_MAT_EXTRU_11_DEPTH, mode=Mode.SUBTRACT)

    # Esquisse30 → Enlèv. mat.-Extru.12 (cut)
    with BuildSketch(Plane.XZ.offset(5.290496283)):
        with Locations((-26.862211313, 13.280210157)):
            Rectangle(ESQUISSE30_W, ESQUISSE30_H)
    extrude(amount=-ENL_V_MAT_EXTRU_12_DEPTH, mode=Mode.SUBTRACT)

    # Congé4
    # the kernel refuses this fillet: 20 mm, written as the material it adds along each edge
    with BuildSketch(Plane(origin=(-130.830662405, 149.040024835, 0), x_dir=(1, 0, 0), z_dir=(0, 0, 1))) as cong_4_piece_1:
        with BuildLine():
            CenterArc((CONG_4_R, -CONG_4_R), CONG_4_R, 90, 90)
            Line((0, -CONG_4_R), (0, 0))
            Line((0, 0), (CONG_4_R, 0))
        make_face()
    extrude(amount=68)
    with BuildSketch(Plane(origin=(-130.830662405, -3.290496283, 68), x_dir=(0, 1, 0), z_dir=(0, 0, -1))) as cong_4_piece_2:
        with BuildLine():
            CenterArc((CONG_4_R, CONG_4_R), CONG_4_R, 180, 90)
            Line((0, CONG_4_R), (0, 0))
            Line((0, 0), (CONG_4_R, 0))
        make_face()
    extrude(amount=68)
    # the kernel refuses this fillet: 20 mm, written as the material it takes off along each edge
    with BuildSketch(Plane(origin=(-132.830662405, -5.290496283, -50), x_dir=(0, 1, 0), z_dir=(0, 0, 1)), Plane(origin=(-132.830662405, 151.040024835, -50), x_dir=(1, 0, 0), z_dir=(0, 0, 1))) as cong_4_2_piece_1:
        with BuildLine():
            CenterArc((CONG_4_R, -CONG_4_R), CONG_4_R, 90, 90)
            Line((0, -CONG_4_R), (0, 0))
            Line((0, 0), (CONG_4_R, 0))
        make_face()
    extrude(amount=170, mode=Mode.SUBTRACT)

    # Congé5
    cong_5_edges = [part.edges().sort_by_distance(p)[0] for p in [
        (12.077218718, -5.290496283, 35),
        (12.077218718, 151.040024835, 35),
    ]]
    fillet(cong_5_edges, radius=CONG_5_R)

    # Esquisse31 → Enlèv. mat.-Extru.13 (cut)
    with BuildSketch(Plane(origin=(12.077218718, 0, 0), x_dir=(0, 0, -1), z_dir=(1, 0, 0))):
        with BuildLine():
            Line((0, 120.991434469), (0, 136.191208624))
            ThreePointArc((0, 136.191208624), (-7.599887078, 128.591321546), (0, 120.991434469))
        make_face()
    extrude(amount=-ENL_V_MAT_EXTRU_13_DEPTH, mode=Mode.SUBTRACT)

    # Congé6
    # the kernel refuses this fillet: 20 mm, written as the material it takes off along each edge
    with BuildSketch(Plane(origin=(12.077218718, 128.591321546, 0), x_dir=(0, 0.003141587485881077, -0.9999950652018582), z_dir=(0, -0.9999950652018582, -0.003141587485881077))) as cong_6_piece_1:
        with BuildLine():
            CenterArc((13.844885076, -20), CONG_6_R, 90, 18.194872339)
            Line((7.599887078, -1), (7.474987118, -0.62))
            ThreePointArc((7.474987118, -0.62), (7.199887078, -0.5), (7.199887078, 0))
            Line((7.199887078, 0), (7.599887078, 0.4))
            Line((7.599887078, 0.4), (13.844885076, 0.4))
            Line((13.844885076, 0.4), (13.844885076, 0))
        make_face()
    revolve(axis=Axis((12.077218718, 128.591321546, 0), (1, 0, 0)), revolution_arc=359.64, mode=Mode.SUBTRACT)

    # Esquisse21 → Enlèv. mat.-Extru.14 (cut)
    with BuildSketch(Plane(origin=(0, 29.709503717, 0), x_dir=(1, 0, 0), z_dir=(0, 1, 0))):
        with Locations(Location((-68.061939997, -22.535603051, 0), (0, 0, 270))):
            Circle(ESQUISSE21_R)
        with Locations(Location((-68.061939997, -32.603026975, 0), (0, 0, 270))):
            Circle(ESQUISSE21_R)
        with Locations(Location((-117.577847279, -22.535603051, 0), (0, 0, 270))):
            Circle(ESQUISSE21_R)
        with Locations(Location((-117.561939997, -32.372185179, 0), (0, 0, 270))):
            Circle(ESQUISSE21_R)
    extrude(amount=-ENL_V_MAT_EXTRU_14_DEPTH, mode=Mode.SUBTRACT)

    # Esquisse34 → Enlèv. mat.-Extru.15 (cut)
    with BuildSketch(Plane(origin=(0, 0, 0), x_dir=(-1, 0, 0), z_dir=(0, 0, -1))):
        with Locations((131.830662405, 31.752830171)):
            Rectangle(ESQUISSE34_W, ESQUISSE34_H)
        with Locations((131.830662405, 108.450383814)):
            Rectangle(ESQUISSE34_W, ESQUISSE34_H)
        with Locations((-11.077218718, 31.752830171)):
            Rectangle(ESQUISSE34_W, ESQUISSE34_H)
        with Locations((-11.077218718, 108.450383814)):
            Rectangle(ESQUISSE34_W, ESQUISSE34_H)
        with Locations((88.44920315, 150.040024835)):
            Rectangle(ESQUISSE34_W_2, ESQUISSE34_H_2)
        with Locations((24.448737585, 150.040024835)):
            Rectangle(ESQUISSE34_W_2, ESQUISSE34_H_2)
        with Locations((24.448737585, -4.290496283)):
            Rectangle(ESQUISSE34_W_2, ESQUISSE34_H_2)
        with Locations((88.44920315, -4.290496283)):
            Rectangle(ESQUISSE34_W_2, ESQUISSE34_H_2)
    extrude(amount=-ENL_V_MAT_EXTRU_15_DEPTH, mode=Mode.SUBTRACT)


solid = part.part
